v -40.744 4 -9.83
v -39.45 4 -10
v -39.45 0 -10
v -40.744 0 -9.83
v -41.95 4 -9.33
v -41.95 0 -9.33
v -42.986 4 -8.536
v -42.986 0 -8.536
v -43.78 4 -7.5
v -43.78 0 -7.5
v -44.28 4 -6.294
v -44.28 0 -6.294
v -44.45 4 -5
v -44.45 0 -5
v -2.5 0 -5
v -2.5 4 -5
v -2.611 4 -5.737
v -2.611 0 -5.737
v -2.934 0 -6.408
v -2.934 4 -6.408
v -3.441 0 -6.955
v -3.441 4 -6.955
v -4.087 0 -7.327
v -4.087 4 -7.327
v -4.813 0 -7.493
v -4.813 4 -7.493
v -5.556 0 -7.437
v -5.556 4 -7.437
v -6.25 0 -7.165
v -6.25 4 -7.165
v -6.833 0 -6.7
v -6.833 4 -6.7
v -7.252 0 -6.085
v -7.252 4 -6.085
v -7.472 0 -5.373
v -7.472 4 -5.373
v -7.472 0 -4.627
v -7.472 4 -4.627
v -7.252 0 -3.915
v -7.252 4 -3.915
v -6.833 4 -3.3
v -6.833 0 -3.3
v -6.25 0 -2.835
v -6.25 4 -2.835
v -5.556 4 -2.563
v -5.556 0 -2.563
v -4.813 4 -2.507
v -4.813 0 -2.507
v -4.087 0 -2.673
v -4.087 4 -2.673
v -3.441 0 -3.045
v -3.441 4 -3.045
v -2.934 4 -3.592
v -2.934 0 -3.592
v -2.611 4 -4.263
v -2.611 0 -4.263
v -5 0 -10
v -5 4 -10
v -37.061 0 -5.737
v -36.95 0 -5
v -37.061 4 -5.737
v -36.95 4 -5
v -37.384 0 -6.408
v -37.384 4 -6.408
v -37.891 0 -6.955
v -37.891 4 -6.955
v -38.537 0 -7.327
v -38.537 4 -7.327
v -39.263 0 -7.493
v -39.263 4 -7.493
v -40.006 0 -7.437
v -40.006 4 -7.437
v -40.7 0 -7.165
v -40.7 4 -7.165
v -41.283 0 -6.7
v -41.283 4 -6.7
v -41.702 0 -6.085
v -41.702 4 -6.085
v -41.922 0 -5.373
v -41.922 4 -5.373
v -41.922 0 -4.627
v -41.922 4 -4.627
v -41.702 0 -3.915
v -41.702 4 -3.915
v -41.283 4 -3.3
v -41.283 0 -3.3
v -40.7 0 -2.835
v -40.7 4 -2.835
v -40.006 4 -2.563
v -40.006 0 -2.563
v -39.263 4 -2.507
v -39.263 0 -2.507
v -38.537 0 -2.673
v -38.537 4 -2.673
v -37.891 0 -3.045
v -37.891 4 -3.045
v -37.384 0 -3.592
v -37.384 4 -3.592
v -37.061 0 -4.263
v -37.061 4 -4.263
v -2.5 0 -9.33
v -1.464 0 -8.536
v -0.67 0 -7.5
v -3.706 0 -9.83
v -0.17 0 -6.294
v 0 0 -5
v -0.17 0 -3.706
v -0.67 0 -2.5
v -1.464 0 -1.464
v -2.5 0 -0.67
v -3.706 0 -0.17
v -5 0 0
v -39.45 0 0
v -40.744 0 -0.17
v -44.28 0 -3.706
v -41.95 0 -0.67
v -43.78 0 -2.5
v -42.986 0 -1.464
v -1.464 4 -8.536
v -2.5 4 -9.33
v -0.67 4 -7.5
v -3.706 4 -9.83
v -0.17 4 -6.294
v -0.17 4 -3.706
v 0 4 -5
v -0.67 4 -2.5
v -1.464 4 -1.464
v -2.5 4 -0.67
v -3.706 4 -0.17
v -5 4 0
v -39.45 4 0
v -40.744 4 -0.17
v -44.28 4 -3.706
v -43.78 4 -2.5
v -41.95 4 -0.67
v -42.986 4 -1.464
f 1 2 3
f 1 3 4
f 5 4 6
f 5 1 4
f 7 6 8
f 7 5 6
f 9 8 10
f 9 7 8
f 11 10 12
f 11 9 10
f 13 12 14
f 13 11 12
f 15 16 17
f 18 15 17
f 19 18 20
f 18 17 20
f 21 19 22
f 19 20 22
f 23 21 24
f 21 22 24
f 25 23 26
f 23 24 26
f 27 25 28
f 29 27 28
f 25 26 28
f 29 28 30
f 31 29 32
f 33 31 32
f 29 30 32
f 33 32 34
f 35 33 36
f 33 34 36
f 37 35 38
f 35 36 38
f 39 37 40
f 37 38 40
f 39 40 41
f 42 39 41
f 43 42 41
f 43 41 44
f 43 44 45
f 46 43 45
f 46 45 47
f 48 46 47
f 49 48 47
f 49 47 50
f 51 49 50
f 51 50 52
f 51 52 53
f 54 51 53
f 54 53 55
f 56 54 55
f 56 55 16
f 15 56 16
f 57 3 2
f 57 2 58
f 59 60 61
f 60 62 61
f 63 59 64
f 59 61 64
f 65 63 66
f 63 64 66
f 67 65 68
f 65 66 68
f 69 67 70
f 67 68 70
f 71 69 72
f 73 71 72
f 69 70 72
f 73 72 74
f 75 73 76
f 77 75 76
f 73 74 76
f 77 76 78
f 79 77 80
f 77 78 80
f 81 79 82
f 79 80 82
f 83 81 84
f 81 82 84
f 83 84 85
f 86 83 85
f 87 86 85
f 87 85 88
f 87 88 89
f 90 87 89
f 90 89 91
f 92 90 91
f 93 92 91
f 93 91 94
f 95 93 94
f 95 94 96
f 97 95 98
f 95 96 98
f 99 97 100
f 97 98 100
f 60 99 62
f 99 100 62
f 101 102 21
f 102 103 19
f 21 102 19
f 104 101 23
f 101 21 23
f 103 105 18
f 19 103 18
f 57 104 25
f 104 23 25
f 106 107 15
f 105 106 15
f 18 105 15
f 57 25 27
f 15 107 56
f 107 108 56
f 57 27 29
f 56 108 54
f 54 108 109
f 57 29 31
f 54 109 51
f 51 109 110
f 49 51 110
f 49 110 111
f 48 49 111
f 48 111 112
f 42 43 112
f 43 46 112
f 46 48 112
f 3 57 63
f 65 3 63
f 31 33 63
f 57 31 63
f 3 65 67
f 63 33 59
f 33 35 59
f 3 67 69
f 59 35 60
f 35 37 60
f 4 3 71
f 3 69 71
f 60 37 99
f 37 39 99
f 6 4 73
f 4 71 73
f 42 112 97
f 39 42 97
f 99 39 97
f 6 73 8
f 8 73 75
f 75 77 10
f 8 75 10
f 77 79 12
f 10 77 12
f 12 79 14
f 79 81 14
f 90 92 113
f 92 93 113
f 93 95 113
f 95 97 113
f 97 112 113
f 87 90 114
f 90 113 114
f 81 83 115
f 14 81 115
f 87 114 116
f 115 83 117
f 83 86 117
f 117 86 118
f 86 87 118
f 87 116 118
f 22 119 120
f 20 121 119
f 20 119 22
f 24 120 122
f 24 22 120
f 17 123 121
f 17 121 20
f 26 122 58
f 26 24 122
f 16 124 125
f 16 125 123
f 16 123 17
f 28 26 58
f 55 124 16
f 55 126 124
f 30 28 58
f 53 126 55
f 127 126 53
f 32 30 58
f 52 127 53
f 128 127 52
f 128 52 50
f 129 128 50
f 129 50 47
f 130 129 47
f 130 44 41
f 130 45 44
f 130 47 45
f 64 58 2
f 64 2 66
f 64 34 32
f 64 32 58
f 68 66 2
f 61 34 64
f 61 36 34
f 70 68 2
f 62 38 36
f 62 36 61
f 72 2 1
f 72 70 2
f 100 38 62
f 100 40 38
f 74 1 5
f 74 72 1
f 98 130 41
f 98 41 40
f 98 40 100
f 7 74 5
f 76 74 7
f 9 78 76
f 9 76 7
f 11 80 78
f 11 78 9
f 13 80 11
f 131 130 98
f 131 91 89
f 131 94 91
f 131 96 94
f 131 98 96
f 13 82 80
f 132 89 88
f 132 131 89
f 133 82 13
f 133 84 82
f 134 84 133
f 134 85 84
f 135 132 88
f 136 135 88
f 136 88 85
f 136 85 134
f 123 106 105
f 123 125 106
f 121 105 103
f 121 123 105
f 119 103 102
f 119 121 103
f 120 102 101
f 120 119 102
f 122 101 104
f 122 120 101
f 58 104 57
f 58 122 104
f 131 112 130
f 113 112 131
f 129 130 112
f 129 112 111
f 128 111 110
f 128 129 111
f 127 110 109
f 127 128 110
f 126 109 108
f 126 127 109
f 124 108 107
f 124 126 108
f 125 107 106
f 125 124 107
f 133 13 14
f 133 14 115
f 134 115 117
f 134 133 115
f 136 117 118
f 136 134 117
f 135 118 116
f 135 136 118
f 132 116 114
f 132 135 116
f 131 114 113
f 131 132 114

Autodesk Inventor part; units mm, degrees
ref_plane "YZ Plane" through (0, 0, 0) normal (1, 0, 0) x (0, 1, 0)
ref_plane "XZ Plane" through (0, 0, 0) normal (0, 1, 0) x (-1, 0, 0)
ref_plane "XY Plane" through (0, 0, 0) normal (0, 0, 1) x (1, 0, 0)
sketch "Sketch1" plane through (0, 0, 0) normal (0, 1, 0) x (-1, 0, 0)
  line L0 (0, 0) -> (44.45, 0)
  line L1 (44.45, 0) -> (44.45, -10)
  line L2 (44.45, -10) -> (0, -10)
  line L3 (0, -10) -> (0, 0)
  dimension "d0" = 44.45
  dimension "d1" = 10
extrude "Extrusion1" add sketch "Sketch1" along normal blind 4
sketch "Sketch2" plane through (0, 4, 0) normal (0, 1, 0) x (1, 0, 0)
  circle A0 centre (-39.45, 5) radius 2.5
  circle A1 centre (-5, 5) radius 2.5
  line L0 (-44.45, 10) -> (-44.45, 0) projected
  point P0 (0, 0)
  dimension "d4" = 5
  dimension "d5" = 5
  dimension "d6" = 5
  dimension "d7" = 5
  dimension "d8" = 5
extrude "Extrusion2" cut sketch "Sketch2" against normal blind 8
fillet "Fillet1" radius 5 4 edges at (-44.45, 2, 0) (0, 2, 0) (0, 2, -10) (-44.45, 2, -10)
properties part number "Linkage" material "Aluminum 6061"
